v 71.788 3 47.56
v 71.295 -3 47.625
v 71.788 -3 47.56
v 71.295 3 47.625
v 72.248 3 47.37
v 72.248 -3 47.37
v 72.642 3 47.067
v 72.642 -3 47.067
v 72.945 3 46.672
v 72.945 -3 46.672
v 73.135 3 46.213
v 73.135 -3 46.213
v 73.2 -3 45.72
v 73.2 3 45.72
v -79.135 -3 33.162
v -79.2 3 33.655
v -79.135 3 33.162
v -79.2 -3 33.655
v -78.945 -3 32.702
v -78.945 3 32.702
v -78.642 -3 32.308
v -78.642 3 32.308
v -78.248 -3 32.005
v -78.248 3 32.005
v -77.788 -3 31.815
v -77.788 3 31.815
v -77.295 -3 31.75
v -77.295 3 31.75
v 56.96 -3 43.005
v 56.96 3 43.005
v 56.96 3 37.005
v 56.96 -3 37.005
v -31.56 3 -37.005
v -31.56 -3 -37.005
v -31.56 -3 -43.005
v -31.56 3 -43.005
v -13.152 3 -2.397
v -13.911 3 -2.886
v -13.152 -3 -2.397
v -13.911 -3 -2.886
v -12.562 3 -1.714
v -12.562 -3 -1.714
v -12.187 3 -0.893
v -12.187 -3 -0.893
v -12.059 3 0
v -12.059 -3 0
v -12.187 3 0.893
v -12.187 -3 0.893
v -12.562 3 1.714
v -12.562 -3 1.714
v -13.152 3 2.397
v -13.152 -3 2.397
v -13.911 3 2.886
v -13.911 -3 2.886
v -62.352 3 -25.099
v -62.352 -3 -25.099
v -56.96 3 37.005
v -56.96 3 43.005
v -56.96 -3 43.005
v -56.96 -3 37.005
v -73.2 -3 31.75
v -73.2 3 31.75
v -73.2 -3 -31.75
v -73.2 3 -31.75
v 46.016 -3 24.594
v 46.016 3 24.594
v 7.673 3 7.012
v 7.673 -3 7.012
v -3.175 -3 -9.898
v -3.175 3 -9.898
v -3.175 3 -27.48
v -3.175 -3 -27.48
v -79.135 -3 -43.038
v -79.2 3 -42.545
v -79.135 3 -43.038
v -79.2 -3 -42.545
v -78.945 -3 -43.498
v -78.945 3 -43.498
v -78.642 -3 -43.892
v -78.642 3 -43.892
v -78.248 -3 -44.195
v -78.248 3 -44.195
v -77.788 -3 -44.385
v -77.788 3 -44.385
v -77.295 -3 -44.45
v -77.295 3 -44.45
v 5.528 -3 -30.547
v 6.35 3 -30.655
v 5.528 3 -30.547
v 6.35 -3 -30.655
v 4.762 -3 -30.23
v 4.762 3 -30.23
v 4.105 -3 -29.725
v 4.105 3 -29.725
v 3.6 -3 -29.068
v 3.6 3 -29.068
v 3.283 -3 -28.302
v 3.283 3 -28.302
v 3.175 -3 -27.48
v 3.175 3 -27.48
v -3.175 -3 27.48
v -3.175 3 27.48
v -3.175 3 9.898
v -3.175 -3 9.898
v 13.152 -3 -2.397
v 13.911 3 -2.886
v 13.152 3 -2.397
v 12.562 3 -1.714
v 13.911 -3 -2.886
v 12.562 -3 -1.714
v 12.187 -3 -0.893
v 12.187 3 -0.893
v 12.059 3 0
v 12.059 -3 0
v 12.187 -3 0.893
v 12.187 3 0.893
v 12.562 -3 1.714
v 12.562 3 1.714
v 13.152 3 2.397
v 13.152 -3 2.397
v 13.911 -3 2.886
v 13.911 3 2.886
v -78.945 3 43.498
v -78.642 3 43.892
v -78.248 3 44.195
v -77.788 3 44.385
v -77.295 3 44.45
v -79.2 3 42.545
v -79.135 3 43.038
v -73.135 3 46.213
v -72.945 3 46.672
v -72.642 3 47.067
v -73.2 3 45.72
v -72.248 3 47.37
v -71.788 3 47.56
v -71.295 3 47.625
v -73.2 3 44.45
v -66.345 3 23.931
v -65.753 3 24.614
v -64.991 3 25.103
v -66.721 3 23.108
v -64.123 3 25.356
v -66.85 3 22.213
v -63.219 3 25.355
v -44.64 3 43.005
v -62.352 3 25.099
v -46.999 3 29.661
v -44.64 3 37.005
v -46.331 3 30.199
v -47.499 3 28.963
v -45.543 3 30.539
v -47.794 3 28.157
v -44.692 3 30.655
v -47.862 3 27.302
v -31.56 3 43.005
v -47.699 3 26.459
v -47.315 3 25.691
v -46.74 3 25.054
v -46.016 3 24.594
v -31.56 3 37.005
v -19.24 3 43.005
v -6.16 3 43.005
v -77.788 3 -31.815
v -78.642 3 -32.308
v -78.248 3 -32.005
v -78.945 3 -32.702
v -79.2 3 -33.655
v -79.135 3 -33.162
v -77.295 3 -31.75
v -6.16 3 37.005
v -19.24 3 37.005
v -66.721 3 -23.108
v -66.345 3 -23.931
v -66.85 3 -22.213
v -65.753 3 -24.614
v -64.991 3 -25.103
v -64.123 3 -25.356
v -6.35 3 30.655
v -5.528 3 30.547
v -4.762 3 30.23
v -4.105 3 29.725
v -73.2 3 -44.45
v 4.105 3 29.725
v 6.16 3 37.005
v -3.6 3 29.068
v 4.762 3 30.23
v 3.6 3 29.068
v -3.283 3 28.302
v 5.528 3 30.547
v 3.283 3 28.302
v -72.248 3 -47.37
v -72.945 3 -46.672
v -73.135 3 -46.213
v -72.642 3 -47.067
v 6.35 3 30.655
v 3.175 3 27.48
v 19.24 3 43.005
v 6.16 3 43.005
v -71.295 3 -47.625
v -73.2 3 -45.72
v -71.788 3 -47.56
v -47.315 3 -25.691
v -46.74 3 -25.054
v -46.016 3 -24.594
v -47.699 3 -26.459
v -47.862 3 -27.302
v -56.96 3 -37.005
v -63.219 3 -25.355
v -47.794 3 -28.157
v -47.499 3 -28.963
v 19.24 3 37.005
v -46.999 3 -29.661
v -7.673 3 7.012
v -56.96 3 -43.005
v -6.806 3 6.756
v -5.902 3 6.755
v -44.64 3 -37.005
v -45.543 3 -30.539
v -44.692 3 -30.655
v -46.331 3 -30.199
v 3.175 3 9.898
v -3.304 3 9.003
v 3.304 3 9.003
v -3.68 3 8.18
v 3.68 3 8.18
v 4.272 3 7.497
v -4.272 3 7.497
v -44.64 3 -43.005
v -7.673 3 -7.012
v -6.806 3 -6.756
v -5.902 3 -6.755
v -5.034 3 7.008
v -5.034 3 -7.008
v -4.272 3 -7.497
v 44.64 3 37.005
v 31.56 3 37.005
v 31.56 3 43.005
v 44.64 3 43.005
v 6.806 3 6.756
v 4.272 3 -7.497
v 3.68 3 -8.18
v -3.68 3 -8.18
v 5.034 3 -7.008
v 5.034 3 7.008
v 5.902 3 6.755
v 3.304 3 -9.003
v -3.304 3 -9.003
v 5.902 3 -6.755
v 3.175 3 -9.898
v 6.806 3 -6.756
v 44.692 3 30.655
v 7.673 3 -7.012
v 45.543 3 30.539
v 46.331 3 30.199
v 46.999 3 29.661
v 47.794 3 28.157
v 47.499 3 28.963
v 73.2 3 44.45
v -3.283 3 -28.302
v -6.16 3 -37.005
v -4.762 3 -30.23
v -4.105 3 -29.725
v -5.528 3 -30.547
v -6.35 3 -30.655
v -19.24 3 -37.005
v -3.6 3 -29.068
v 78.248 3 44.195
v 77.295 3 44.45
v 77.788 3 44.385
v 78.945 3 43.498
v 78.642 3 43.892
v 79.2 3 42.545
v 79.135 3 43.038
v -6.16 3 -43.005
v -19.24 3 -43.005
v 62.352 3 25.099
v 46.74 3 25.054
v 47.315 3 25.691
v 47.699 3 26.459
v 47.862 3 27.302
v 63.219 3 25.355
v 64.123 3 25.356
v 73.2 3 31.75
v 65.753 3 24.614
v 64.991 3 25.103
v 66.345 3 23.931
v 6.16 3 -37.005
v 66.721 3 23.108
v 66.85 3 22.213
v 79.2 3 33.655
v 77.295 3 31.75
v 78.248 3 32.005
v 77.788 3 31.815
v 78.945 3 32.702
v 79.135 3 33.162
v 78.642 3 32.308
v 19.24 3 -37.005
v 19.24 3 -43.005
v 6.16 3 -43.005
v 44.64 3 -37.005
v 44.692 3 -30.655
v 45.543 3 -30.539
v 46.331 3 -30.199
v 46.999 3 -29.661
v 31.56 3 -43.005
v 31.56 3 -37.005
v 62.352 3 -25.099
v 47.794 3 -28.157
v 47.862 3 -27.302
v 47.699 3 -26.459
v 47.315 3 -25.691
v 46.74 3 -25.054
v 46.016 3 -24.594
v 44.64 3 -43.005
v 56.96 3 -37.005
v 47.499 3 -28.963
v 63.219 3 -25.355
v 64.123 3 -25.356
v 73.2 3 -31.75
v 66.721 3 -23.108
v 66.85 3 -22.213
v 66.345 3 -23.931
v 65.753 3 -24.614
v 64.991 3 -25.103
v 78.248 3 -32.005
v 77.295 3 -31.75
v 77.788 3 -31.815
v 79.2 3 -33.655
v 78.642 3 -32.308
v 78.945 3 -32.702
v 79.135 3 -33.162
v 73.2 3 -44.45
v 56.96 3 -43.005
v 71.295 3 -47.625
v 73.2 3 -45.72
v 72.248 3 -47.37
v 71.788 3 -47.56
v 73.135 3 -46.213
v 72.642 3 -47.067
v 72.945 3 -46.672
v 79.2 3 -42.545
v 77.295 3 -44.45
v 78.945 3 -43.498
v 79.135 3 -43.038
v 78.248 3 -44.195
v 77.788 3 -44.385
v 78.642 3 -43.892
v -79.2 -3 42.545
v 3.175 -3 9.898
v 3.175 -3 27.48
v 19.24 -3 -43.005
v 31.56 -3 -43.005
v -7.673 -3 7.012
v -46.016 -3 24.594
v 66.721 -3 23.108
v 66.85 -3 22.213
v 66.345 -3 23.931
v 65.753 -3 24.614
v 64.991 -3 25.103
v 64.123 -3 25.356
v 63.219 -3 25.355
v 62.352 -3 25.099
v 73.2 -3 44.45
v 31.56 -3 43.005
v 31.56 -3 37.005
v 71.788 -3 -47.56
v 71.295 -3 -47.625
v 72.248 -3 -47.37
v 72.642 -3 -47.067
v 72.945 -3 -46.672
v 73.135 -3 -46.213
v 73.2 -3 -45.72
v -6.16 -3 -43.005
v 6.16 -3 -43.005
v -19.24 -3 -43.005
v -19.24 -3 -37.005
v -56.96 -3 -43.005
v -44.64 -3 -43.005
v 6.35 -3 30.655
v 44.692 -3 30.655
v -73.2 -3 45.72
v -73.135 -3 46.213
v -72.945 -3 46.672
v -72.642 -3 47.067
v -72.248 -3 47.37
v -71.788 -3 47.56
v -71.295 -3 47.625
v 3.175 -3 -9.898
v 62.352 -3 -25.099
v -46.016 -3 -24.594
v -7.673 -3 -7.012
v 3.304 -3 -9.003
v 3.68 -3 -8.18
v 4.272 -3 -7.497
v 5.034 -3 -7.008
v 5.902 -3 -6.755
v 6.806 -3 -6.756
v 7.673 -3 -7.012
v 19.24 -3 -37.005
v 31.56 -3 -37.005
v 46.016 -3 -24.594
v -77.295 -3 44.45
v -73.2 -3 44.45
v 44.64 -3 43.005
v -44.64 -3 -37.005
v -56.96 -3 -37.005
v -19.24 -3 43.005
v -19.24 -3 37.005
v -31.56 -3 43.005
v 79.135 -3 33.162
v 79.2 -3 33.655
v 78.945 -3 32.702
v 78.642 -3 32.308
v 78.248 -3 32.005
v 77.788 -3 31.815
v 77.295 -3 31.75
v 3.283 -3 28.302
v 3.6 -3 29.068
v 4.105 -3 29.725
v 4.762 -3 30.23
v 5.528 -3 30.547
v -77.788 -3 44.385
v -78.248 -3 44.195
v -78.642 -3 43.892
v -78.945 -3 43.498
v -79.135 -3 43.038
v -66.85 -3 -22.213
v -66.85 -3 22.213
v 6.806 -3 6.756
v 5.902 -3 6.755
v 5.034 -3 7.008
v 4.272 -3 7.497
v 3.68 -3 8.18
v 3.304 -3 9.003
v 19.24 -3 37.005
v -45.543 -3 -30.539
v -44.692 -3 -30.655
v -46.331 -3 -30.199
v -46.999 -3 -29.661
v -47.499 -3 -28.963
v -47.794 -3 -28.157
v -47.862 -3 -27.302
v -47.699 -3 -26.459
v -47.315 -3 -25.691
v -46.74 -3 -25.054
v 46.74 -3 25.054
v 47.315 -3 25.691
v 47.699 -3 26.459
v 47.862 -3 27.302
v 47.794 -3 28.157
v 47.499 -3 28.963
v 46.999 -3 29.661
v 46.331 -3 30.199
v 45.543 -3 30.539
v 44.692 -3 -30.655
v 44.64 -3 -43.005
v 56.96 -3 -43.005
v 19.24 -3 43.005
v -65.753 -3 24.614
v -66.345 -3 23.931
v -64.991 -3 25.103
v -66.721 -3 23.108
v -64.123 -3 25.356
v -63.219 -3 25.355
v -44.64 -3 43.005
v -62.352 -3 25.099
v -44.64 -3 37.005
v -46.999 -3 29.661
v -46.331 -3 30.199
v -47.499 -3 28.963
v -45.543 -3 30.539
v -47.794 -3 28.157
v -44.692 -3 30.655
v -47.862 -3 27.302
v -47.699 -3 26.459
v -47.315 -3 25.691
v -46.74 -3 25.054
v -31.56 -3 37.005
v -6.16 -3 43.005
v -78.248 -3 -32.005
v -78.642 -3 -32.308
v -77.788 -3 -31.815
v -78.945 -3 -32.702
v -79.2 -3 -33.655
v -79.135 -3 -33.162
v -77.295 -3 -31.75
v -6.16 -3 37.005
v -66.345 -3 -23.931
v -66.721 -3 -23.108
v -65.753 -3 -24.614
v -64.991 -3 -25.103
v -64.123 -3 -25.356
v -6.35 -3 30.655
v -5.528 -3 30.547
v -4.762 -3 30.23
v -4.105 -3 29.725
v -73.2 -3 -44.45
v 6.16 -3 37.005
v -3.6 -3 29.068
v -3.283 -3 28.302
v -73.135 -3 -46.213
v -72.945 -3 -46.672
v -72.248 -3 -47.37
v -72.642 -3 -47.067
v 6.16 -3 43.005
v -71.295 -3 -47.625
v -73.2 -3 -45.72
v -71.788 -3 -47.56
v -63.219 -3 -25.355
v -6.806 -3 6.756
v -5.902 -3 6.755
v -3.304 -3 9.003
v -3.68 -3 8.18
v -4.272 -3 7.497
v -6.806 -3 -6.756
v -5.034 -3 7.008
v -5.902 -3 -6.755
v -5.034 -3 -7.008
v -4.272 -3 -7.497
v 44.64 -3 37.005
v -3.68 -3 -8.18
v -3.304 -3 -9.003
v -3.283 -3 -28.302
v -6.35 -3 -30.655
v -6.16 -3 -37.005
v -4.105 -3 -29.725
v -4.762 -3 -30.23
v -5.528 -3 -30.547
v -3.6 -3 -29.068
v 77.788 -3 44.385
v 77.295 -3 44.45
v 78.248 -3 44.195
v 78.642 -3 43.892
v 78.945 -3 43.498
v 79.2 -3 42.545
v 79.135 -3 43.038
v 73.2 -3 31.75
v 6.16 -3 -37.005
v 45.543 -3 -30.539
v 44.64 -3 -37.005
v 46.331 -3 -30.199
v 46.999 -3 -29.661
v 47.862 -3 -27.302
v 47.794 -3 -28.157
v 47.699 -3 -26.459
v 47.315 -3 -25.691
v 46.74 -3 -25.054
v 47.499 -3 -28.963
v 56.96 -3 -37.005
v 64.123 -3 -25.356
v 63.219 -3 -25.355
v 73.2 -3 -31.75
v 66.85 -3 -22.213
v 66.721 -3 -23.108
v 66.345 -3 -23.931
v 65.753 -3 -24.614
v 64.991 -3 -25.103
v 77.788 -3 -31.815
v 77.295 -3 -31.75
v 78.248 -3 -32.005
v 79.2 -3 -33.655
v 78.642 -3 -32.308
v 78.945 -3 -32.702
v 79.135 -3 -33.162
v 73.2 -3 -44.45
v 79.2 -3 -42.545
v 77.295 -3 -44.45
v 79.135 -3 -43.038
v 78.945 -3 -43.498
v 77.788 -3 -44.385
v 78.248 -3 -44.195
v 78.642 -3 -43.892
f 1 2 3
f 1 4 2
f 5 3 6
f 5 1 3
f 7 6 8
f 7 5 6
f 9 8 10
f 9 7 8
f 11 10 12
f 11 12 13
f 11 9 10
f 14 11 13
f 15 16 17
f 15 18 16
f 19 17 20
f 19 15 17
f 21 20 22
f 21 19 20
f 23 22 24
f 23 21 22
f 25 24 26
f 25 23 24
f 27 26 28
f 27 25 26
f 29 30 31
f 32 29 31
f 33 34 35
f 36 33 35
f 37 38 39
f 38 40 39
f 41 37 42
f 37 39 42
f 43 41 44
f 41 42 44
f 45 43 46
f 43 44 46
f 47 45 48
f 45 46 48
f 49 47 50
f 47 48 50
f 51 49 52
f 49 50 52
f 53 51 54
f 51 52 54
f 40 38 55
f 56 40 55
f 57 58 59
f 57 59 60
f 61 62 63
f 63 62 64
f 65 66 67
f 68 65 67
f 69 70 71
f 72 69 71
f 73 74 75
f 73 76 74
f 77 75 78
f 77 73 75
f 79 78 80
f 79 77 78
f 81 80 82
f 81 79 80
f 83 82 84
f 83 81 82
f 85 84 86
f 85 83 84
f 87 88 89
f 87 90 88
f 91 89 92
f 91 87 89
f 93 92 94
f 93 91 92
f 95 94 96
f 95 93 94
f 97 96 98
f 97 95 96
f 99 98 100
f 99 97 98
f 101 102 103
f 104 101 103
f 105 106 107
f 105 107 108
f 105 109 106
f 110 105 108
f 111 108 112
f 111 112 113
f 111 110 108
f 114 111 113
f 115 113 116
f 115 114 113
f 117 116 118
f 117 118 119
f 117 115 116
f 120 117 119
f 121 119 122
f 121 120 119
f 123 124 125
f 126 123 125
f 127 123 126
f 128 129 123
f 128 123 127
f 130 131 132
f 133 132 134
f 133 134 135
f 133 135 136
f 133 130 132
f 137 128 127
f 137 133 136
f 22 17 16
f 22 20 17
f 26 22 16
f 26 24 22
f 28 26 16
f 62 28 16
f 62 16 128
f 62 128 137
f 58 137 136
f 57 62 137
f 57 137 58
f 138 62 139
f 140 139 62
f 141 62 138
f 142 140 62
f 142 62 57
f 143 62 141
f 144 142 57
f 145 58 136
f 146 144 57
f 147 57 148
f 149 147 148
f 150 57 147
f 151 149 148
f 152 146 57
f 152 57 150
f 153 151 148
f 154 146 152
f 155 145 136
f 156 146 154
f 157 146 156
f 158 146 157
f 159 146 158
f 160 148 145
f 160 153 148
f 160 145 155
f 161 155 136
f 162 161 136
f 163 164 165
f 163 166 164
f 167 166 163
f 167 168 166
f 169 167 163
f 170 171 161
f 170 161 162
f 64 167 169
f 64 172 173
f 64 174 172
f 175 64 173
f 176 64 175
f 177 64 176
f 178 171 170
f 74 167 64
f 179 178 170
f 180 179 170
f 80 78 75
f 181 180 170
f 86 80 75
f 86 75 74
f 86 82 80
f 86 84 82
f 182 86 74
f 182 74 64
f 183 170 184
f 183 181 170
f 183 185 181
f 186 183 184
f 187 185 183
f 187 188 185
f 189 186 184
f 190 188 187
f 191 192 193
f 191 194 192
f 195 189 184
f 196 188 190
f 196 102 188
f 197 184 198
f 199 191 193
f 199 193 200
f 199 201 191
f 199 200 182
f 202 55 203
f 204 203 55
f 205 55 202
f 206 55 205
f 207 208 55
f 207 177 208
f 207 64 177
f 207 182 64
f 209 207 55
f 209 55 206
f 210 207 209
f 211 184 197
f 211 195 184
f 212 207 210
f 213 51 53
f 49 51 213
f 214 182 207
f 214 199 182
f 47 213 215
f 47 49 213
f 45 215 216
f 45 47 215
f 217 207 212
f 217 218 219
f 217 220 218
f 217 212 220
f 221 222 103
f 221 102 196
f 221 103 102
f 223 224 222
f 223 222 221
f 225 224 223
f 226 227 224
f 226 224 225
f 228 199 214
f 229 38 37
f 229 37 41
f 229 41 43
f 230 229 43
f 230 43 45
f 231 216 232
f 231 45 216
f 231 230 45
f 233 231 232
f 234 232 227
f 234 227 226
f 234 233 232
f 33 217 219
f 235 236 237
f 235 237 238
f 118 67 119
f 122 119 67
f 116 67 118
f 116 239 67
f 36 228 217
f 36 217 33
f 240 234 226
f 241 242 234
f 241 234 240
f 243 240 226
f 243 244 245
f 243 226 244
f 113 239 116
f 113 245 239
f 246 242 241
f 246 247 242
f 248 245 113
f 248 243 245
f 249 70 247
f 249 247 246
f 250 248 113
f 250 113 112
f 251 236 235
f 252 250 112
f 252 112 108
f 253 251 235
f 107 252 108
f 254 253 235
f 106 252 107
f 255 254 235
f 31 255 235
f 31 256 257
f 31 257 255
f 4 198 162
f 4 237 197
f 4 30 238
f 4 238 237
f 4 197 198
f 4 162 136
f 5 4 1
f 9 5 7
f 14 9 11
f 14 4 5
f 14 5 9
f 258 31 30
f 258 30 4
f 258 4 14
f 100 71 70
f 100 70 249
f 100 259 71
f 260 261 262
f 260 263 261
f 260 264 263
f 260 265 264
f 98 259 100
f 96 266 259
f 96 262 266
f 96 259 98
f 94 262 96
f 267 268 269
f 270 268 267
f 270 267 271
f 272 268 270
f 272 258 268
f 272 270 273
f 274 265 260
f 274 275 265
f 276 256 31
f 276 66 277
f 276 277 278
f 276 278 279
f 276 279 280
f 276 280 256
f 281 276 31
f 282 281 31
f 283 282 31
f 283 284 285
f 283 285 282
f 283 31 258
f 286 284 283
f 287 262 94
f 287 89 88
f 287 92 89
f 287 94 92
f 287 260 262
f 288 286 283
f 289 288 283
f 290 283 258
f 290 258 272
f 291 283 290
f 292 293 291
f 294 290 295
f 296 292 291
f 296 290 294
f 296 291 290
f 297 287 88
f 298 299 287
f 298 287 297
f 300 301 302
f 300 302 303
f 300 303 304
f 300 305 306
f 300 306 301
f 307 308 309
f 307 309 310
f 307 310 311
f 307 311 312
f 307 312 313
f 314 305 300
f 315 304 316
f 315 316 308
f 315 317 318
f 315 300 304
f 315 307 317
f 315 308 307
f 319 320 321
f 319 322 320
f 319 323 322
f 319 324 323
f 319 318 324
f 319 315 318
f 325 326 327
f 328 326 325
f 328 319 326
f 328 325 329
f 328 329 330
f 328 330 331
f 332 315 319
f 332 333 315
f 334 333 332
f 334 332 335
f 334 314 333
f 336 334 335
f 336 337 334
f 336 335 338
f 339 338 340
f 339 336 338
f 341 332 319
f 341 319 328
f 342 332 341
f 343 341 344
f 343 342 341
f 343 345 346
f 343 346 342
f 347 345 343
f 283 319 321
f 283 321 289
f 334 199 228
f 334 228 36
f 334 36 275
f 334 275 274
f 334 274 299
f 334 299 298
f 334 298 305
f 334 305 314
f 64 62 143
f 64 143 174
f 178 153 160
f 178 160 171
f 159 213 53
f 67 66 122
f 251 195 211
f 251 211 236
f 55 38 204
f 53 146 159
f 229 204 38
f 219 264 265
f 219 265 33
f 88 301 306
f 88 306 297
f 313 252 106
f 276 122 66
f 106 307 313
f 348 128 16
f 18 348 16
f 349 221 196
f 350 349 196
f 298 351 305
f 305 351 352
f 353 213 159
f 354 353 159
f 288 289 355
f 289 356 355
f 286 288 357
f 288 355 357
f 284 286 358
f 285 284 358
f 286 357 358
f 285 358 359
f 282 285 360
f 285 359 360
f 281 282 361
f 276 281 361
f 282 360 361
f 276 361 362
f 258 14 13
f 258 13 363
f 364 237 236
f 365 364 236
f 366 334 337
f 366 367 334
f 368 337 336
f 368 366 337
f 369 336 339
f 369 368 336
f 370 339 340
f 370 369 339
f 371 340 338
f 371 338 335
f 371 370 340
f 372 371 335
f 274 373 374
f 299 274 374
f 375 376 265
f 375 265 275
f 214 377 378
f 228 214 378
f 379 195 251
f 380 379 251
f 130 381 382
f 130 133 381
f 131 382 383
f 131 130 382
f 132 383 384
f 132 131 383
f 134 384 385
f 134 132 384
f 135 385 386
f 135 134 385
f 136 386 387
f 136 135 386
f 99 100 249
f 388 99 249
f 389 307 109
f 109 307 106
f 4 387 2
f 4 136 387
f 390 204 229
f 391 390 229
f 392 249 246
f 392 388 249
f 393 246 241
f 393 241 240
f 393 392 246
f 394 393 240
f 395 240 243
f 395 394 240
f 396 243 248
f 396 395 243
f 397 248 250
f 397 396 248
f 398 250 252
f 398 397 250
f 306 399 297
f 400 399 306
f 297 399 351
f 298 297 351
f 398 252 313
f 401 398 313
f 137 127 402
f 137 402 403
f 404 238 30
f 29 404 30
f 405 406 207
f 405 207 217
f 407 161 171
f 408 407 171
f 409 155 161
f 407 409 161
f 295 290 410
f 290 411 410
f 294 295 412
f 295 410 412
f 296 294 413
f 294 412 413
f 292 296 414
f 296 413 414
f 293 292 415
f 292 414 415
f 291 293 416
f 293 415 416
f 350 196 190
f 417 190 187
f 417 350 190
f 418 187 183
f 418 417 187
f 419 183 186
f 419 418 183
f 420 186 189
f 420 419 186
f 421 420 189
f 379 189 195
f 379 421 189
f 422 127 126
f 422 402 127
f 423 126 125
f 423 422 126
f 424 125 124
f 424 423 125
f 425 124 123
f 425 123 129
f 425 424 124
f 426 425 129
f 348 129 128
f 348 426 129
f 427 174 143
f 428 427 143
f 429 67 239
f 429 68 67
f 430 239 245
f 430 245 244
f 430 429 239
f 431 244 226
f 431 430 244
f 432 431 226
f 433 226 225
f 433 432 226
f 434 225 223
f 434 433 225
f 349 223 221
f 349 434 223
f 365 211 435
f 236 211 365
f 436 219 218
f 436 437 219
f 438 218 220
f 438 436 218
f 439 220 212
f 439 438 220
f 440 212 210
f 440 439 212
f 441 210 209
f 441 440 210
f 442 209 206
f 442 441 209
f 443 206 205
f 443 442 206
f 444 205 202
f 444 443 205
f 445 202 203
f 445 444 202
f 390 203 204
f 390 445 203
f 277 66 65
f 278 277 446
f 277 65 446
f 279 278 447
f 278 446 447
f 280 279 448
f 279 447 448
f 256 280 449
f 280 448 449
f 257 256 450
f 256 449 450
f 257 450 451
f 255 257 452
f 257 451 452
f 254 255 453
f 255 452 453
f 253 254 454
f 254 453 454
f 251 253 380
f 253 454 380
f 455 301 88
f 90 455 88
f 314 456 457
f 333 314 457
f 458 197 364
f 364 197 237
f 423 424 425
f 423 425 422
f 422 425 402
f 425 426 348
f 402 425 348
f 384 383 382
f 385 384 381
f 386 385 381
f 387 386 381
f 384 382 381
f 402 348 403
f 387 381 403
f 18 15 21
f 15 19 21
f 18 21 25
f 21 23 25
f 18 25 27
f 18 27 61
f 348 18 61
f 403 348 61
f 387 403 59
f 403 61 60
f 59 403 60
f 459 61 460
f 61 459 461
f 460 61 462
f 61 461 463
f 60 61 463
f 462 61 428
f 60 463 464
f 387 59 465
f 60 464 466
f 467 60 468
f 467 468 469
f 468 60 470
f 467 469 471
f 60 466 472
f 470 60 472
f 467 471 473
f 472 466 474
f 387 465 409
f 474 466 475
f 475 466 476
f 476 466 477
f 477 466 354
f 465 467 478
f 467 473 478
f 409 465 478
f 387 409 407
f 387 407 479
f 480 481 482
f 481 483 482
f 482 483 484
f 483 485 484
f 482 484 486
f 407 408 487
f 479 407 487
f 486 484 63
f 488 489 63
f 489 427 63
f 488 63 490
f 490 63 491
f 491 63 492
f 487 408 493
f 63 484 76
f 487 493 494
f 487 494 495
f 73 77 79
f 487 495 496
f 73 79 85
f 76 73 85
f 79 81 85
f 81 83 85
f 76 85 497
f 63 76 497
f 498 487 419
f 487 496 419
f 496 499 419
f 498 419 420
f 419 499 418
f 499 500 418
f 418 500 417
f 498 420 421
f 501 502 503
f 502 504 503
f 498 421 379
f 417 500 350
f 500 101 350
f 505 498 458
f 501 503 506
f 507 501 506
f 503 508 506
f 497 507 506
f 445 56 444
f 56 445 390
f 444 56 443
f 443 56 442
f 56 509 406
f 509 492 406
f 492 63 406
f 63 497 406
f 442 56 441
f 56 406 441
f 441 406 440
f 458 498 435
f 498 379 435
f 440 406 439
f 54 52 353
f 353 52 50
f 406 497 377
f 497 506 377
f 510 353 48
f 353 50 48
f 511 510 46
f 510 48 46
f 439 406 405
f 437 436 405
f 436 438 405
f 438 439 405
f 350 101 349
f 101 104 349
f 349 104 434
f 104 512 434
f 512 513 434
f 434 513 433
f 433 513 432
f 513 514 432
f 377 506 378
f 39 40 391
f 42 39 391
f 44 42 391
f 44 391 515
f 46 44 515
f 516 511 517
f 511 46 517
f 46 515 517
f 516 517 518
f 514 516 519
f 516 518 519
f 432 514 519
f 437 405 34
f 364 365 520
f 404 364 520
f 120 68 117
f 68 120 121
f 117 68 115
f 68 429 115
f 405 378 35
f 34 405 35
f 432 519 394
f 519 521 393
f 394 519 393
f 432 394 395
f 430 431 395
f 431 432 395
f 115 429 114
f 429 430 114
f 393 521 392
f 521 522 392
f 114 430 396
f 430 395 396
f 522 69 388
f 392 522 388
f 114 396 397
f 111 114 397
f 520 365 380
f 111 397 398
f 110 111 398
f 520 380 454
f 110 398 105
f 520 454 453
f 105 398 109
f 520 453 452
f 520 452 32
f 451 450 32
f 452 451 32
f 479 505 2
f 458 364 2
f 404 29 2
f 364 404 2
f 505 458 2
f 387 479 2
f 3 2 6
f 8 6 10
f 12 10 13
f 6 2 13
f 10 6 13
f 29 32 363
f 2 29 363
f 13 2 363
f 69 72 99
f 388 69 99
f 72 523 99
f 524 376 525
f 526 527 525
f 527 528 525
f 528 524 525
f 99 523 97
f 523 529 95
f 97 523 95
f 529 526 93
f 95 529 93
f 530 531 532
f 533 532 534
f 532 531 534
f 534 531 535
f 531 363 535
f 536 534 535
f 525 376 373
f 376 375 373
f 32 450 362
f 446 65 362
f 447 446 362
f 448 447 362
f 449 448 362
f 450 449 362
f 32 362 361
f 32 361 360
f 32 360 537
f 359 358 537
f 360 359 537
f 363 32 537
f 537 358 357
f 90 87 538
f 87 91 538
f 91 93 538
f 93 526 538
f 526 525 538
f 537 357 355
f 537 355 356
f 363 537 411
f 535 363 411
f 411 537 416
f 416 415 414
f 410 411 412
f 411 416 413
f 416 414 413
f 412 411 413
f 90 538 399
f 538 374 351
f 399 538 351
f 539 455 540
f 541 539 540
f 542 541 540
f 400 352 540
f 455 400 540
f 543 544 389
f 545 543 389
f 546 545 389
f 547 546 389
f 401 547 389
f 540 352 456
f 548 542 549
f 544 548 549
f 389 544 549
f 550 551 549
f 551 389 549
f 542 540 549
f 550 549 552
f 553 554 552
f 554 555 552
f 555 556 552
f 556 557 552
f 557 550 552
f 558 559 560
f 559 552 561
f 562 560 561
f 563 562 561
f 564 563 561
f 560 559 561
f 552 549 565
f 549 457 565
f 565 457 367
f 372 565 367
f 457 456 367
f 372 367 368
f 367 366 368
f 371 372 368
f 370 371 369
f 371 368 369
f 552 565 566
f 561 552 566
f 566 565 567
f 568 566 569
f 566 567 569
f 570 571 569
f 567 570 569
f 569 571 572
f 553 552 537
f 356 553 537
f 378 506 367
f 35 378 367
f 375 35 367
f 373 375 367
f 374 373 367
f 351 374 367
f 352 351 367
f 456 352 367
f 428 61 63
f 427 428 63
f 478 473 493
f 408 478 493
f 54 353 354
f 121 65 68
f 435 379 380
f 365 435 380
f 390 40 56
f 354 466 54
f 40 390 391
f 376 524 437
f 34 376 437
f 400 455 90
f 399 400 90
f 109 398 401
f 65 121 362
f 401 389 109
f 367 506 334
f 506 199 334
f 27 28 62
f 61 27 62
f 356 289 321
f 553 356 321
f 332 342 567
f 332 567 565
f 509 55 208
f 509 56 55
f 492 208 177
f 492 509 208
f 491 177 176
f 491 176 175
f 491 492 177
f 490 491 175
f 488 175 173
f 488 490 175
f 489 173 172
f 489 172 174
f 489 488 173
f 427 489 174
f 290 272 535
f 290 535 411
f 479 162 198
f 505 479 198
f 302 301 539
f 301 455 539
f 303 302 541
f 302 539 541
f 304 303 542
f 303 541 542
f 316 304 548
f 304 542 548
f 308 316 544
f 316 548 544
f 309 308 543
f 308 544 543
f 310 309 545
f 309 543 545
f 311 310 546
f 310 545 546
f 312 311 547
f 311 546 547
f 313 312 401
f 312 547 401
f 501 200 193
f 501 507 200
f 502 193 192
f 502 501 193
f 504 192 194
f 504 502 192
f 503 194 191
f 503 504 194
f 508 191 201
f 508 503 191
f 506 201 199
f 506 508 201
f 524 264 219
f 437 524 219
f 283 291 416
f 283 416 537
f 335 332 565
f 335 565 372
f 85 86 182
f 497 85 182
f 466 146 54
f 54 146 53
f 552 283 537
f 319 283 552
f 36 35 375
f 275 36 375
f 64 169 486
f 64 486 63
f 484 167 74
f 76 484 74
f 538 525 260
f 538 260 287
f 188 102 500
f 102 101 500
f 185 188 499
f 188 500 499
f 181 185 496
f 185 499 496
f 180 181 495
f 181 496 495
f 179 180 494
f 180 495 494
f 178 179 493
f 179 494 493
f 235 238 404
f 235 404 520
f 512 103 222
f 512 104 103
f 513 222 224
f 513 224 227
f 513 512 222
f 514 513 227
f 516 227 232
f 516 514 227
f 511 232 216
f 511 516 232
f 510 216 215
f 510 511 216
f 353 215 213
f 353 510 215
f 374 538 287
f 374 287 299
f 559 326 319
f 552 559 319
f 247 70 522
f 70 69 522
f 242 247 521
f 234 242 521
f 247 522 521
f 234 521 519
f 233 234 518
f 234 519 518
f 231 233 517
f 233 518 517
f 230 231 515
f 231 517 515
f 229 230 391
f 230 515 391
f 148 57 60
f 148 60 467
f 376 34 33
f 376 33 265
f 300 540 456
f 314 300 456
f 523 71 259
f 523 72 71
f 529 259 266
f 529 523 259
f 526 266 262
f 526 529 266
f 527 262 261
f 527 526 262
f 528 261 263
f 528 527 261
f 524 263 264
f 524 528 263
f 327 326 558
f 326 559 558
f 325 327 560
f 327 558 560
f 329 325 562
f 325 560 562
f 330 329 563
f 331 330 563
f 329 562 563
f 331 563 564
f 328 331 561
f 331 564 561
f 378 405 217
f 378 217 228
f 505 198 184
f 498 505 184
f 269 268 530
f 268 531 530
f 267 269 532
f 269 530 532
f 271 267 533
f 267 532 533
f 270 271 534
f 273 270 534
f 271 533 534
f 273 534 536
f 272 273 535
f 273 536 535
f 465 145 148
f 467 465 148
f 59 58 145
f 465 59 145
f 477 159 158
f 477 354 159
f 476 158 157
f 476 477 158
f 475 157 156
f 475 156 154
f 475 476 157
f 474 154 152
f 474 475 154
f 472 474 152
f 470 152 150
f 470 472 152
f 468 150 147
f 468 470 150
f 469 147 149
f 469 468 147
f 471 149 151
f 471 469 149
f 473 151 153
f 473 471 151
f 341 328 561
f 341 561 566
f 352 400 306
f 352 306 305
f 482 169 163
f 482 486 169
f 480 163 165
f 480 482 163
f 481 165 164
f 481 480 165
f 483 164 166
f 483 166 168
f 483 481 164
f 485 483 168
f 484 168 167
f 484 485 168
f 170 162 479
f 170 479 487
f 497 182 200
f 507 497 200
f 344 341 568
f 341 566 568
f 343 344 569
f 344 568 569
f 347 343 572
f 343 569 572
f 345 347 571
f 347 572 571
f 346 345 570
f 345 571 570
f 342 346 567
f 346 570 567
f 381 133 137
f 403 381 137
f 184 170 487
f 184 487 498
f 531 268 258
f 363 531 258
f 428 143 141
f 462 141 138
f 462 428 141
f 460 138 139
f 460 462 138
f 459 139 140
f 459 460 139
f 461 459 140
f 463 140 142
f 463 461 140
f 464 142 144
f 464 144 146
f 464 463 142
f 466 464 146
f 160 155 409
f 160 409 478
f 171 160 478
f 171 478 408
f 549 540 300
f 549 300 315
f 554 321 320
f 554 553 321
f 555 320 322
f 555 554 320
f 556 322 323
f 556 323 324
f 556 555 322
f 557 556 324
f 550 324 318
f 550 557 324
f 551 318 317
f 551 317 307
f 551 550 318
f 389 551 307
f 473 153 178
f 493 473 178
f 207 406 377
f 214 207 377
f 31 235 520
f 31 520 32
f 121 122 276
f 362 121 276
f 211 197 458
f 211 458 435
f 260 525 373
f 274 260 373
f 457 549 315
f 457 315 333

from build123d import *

# Parameters (mm, degrees)
SKETCH1_W           = 146.4
SKETCH1_H           = 95.25
BOSS_EXTRUDE1_DEPTH = 3
SKETCH2_W           = 6
SKETCH2_H           = 12.7
BOSS_EXTRUDE2_DEPTH = 6
SKETCH3_W           = 12.319
SKETCH3_H           = 6
CUT_EXTRUDE1_DEPTH  = 93.610909859
LPATTERN3_COUNT     = 3
LPATTERN3_PITCH     = 25.4
LPATTERN3_COL_COUNT = 3
LPATTERN3_COL_PITCH = 25.4
CUT_EXTRUDE2_DEPTH  = 93.610909859
FILLET1_R           = 3.175
FILLET2_R           = 1.905


with BuildPart() as part:
    # Sketch1 → Boss-Extrude1 (new, symmetric)
    with BuildSketch(Plane(origin=(0, 0, 0), x_dir=(1, 0, 0), z_dir=(0, 1, 0))):
        Rectangle(SKETCH1_W, SKETCH1_H)
    extrude(amount=BOSS_EXTRUDE1_DEPTH, both=True)

    # Sketch2 → Boss-Extrude2 (add)
    with BuildSketch(Plane(origin=(0, 3, 0), x_dir=(1, 0, 0), z_dir=(0, 1, 0))):
        with Locations((-76.2, 38.1)):
            Rectangle(SKETCH2_W, SKETCH2_H)
        with Locations((-76.2, -38.1)):
            Rectangle(SKETCH2_W, SKETCH2_H)
    boss_extrude2 = extrude(amount=-BOSS_EXTRUDE2_DEPTH)

    # Mirror1: Boss-Extrude2 across plane
    add(boss_extrude2.mirror(Plane(origin=(0, 0, 0), x_dir=(0, 0, 1), z_dir=(1, 0, 0))))

    # Sketch3 → Cut-Extrude1 (cut, symmetric)
    with BuildSketch(Plane(origin=(0, 3, 0), x_dir=(1, 0, 0), z_dir=(0, 1, 0))):
        with Locations((0, 40.005)):
            Rectangle(SKETCH3_W, SKETCH3_H)
        with Locations((0, -40.005)):
            Rectangle(SKETCH3_W, SKETCH3_H)
    cut_extrude1 = extrude(amount=CUT_EXTRUDE1_DEPTH, both=True, mode=Mode.SUBTRACT)

    # LPattern3: Cut-Extrude1 ×3
    with Locations(*[(i * LPATTERN3_PITCH, 0, 0) for i in range(1, LPATTERN3_COUNT)]):
        add(cut_extrude1, mode=Mode.SUBTRACT)

    # LPattern3 col: Cut-Extrude1 ×3
    with Locations(*[(-i * LPATTERN3_COL_PITCH, 0, 0) for i in range(1, LPATTERN3_COL_COUNT)]):
        add(cut_extrude1, mode=Mode.SUBTRACT)

    # Sketch4 → Cut-Extrude2 (cut, through all)
    with BuildSketch(Plane(origin=(0, 3, 0), x_dir=(1, 0, 0), z_dir=(0, 1, 0))):
        Polygon((-7.617051812, 0), (-66.85, 27.16209464), (-66.85, -27.16209464), align=None)
        Polygon((-3.175, 4.948845898), (-3.175, 30.655), (-59.232948188, 30.655), align=None)
        Polygon((59.232948188, 30.655), (3.175, 30.655), (3.175, 4.948845898), align=None)
        Polygon((66.85, -27.16209464), (66.85, 27.16209464), (7.617051812, 0), align=None)
        Polygon((59.232948188, -30.655), (3.175, -4.948845898), (3.175, -30.655), align=None)
        Polygon((-3.175, -30.655), (-3.175, -4.948845898), (-59.232948188, -30.655), align=None)
    extrude(amount=-CUT_EXTRUDE2_DEPTH, mode=Mode.SUBTRACT)

    # Fillet1
    fillet1_edges = [part.edges().sort_by_distance(p)[0] for p in [
        (66.85, 0, -27.16209464),
        (66.85, 0, 27.16209464),
        (7.617051812, 0, 0),
        (3.175, 0, 4.948845898),
        (59.232948188, 0, 30.655),
        (3.175, 0, 30.655),
        (3.175, 0, -30.655),
        (59.232948188, 0, -30.655),
        (3.175, 0, -4.948845898),
        (-59.232948188, 0, -30.655),
        (-3.175, 0, -30.655),
        (-3.175, 0, -4.948845898),
        (-3.175, 0, 4.948845898),
        (-3.175, 0, 30.655),
        (-59.232948188, 0, 30.655),
        (-7.617051812, 0, 0),
        (-66.85, 0, 27.16209464),
        (-66.85, 0, -27.16209464),
    ]]
    fillet(fillet1_edges, radius=FILLET1_R)

    # Fillet2
    fillet2_edges = [part.edges().sort_by_distance(p)[0] for p in [
        (-79.2, 0, -31.75),
        (-79.2, 0, -44.45),
        (-79.2, 0, 44.45),
        (-79.2, 0, 31.75),
        (79.2, 0, -31.75),
        (79.2, 0, -44.45),
        (79.2, 0, 44.45),
        (79.2, 0, 31.75),
        (-73.2, 0, -47.625),
        (73.2, 0, -47.625),
        (73.2, 0, 47.625),
        (-73.2, 0, 47.625),
    ]]
    fillet(fillet2_edges, radius=FILLET2_R)


solid = part.part
